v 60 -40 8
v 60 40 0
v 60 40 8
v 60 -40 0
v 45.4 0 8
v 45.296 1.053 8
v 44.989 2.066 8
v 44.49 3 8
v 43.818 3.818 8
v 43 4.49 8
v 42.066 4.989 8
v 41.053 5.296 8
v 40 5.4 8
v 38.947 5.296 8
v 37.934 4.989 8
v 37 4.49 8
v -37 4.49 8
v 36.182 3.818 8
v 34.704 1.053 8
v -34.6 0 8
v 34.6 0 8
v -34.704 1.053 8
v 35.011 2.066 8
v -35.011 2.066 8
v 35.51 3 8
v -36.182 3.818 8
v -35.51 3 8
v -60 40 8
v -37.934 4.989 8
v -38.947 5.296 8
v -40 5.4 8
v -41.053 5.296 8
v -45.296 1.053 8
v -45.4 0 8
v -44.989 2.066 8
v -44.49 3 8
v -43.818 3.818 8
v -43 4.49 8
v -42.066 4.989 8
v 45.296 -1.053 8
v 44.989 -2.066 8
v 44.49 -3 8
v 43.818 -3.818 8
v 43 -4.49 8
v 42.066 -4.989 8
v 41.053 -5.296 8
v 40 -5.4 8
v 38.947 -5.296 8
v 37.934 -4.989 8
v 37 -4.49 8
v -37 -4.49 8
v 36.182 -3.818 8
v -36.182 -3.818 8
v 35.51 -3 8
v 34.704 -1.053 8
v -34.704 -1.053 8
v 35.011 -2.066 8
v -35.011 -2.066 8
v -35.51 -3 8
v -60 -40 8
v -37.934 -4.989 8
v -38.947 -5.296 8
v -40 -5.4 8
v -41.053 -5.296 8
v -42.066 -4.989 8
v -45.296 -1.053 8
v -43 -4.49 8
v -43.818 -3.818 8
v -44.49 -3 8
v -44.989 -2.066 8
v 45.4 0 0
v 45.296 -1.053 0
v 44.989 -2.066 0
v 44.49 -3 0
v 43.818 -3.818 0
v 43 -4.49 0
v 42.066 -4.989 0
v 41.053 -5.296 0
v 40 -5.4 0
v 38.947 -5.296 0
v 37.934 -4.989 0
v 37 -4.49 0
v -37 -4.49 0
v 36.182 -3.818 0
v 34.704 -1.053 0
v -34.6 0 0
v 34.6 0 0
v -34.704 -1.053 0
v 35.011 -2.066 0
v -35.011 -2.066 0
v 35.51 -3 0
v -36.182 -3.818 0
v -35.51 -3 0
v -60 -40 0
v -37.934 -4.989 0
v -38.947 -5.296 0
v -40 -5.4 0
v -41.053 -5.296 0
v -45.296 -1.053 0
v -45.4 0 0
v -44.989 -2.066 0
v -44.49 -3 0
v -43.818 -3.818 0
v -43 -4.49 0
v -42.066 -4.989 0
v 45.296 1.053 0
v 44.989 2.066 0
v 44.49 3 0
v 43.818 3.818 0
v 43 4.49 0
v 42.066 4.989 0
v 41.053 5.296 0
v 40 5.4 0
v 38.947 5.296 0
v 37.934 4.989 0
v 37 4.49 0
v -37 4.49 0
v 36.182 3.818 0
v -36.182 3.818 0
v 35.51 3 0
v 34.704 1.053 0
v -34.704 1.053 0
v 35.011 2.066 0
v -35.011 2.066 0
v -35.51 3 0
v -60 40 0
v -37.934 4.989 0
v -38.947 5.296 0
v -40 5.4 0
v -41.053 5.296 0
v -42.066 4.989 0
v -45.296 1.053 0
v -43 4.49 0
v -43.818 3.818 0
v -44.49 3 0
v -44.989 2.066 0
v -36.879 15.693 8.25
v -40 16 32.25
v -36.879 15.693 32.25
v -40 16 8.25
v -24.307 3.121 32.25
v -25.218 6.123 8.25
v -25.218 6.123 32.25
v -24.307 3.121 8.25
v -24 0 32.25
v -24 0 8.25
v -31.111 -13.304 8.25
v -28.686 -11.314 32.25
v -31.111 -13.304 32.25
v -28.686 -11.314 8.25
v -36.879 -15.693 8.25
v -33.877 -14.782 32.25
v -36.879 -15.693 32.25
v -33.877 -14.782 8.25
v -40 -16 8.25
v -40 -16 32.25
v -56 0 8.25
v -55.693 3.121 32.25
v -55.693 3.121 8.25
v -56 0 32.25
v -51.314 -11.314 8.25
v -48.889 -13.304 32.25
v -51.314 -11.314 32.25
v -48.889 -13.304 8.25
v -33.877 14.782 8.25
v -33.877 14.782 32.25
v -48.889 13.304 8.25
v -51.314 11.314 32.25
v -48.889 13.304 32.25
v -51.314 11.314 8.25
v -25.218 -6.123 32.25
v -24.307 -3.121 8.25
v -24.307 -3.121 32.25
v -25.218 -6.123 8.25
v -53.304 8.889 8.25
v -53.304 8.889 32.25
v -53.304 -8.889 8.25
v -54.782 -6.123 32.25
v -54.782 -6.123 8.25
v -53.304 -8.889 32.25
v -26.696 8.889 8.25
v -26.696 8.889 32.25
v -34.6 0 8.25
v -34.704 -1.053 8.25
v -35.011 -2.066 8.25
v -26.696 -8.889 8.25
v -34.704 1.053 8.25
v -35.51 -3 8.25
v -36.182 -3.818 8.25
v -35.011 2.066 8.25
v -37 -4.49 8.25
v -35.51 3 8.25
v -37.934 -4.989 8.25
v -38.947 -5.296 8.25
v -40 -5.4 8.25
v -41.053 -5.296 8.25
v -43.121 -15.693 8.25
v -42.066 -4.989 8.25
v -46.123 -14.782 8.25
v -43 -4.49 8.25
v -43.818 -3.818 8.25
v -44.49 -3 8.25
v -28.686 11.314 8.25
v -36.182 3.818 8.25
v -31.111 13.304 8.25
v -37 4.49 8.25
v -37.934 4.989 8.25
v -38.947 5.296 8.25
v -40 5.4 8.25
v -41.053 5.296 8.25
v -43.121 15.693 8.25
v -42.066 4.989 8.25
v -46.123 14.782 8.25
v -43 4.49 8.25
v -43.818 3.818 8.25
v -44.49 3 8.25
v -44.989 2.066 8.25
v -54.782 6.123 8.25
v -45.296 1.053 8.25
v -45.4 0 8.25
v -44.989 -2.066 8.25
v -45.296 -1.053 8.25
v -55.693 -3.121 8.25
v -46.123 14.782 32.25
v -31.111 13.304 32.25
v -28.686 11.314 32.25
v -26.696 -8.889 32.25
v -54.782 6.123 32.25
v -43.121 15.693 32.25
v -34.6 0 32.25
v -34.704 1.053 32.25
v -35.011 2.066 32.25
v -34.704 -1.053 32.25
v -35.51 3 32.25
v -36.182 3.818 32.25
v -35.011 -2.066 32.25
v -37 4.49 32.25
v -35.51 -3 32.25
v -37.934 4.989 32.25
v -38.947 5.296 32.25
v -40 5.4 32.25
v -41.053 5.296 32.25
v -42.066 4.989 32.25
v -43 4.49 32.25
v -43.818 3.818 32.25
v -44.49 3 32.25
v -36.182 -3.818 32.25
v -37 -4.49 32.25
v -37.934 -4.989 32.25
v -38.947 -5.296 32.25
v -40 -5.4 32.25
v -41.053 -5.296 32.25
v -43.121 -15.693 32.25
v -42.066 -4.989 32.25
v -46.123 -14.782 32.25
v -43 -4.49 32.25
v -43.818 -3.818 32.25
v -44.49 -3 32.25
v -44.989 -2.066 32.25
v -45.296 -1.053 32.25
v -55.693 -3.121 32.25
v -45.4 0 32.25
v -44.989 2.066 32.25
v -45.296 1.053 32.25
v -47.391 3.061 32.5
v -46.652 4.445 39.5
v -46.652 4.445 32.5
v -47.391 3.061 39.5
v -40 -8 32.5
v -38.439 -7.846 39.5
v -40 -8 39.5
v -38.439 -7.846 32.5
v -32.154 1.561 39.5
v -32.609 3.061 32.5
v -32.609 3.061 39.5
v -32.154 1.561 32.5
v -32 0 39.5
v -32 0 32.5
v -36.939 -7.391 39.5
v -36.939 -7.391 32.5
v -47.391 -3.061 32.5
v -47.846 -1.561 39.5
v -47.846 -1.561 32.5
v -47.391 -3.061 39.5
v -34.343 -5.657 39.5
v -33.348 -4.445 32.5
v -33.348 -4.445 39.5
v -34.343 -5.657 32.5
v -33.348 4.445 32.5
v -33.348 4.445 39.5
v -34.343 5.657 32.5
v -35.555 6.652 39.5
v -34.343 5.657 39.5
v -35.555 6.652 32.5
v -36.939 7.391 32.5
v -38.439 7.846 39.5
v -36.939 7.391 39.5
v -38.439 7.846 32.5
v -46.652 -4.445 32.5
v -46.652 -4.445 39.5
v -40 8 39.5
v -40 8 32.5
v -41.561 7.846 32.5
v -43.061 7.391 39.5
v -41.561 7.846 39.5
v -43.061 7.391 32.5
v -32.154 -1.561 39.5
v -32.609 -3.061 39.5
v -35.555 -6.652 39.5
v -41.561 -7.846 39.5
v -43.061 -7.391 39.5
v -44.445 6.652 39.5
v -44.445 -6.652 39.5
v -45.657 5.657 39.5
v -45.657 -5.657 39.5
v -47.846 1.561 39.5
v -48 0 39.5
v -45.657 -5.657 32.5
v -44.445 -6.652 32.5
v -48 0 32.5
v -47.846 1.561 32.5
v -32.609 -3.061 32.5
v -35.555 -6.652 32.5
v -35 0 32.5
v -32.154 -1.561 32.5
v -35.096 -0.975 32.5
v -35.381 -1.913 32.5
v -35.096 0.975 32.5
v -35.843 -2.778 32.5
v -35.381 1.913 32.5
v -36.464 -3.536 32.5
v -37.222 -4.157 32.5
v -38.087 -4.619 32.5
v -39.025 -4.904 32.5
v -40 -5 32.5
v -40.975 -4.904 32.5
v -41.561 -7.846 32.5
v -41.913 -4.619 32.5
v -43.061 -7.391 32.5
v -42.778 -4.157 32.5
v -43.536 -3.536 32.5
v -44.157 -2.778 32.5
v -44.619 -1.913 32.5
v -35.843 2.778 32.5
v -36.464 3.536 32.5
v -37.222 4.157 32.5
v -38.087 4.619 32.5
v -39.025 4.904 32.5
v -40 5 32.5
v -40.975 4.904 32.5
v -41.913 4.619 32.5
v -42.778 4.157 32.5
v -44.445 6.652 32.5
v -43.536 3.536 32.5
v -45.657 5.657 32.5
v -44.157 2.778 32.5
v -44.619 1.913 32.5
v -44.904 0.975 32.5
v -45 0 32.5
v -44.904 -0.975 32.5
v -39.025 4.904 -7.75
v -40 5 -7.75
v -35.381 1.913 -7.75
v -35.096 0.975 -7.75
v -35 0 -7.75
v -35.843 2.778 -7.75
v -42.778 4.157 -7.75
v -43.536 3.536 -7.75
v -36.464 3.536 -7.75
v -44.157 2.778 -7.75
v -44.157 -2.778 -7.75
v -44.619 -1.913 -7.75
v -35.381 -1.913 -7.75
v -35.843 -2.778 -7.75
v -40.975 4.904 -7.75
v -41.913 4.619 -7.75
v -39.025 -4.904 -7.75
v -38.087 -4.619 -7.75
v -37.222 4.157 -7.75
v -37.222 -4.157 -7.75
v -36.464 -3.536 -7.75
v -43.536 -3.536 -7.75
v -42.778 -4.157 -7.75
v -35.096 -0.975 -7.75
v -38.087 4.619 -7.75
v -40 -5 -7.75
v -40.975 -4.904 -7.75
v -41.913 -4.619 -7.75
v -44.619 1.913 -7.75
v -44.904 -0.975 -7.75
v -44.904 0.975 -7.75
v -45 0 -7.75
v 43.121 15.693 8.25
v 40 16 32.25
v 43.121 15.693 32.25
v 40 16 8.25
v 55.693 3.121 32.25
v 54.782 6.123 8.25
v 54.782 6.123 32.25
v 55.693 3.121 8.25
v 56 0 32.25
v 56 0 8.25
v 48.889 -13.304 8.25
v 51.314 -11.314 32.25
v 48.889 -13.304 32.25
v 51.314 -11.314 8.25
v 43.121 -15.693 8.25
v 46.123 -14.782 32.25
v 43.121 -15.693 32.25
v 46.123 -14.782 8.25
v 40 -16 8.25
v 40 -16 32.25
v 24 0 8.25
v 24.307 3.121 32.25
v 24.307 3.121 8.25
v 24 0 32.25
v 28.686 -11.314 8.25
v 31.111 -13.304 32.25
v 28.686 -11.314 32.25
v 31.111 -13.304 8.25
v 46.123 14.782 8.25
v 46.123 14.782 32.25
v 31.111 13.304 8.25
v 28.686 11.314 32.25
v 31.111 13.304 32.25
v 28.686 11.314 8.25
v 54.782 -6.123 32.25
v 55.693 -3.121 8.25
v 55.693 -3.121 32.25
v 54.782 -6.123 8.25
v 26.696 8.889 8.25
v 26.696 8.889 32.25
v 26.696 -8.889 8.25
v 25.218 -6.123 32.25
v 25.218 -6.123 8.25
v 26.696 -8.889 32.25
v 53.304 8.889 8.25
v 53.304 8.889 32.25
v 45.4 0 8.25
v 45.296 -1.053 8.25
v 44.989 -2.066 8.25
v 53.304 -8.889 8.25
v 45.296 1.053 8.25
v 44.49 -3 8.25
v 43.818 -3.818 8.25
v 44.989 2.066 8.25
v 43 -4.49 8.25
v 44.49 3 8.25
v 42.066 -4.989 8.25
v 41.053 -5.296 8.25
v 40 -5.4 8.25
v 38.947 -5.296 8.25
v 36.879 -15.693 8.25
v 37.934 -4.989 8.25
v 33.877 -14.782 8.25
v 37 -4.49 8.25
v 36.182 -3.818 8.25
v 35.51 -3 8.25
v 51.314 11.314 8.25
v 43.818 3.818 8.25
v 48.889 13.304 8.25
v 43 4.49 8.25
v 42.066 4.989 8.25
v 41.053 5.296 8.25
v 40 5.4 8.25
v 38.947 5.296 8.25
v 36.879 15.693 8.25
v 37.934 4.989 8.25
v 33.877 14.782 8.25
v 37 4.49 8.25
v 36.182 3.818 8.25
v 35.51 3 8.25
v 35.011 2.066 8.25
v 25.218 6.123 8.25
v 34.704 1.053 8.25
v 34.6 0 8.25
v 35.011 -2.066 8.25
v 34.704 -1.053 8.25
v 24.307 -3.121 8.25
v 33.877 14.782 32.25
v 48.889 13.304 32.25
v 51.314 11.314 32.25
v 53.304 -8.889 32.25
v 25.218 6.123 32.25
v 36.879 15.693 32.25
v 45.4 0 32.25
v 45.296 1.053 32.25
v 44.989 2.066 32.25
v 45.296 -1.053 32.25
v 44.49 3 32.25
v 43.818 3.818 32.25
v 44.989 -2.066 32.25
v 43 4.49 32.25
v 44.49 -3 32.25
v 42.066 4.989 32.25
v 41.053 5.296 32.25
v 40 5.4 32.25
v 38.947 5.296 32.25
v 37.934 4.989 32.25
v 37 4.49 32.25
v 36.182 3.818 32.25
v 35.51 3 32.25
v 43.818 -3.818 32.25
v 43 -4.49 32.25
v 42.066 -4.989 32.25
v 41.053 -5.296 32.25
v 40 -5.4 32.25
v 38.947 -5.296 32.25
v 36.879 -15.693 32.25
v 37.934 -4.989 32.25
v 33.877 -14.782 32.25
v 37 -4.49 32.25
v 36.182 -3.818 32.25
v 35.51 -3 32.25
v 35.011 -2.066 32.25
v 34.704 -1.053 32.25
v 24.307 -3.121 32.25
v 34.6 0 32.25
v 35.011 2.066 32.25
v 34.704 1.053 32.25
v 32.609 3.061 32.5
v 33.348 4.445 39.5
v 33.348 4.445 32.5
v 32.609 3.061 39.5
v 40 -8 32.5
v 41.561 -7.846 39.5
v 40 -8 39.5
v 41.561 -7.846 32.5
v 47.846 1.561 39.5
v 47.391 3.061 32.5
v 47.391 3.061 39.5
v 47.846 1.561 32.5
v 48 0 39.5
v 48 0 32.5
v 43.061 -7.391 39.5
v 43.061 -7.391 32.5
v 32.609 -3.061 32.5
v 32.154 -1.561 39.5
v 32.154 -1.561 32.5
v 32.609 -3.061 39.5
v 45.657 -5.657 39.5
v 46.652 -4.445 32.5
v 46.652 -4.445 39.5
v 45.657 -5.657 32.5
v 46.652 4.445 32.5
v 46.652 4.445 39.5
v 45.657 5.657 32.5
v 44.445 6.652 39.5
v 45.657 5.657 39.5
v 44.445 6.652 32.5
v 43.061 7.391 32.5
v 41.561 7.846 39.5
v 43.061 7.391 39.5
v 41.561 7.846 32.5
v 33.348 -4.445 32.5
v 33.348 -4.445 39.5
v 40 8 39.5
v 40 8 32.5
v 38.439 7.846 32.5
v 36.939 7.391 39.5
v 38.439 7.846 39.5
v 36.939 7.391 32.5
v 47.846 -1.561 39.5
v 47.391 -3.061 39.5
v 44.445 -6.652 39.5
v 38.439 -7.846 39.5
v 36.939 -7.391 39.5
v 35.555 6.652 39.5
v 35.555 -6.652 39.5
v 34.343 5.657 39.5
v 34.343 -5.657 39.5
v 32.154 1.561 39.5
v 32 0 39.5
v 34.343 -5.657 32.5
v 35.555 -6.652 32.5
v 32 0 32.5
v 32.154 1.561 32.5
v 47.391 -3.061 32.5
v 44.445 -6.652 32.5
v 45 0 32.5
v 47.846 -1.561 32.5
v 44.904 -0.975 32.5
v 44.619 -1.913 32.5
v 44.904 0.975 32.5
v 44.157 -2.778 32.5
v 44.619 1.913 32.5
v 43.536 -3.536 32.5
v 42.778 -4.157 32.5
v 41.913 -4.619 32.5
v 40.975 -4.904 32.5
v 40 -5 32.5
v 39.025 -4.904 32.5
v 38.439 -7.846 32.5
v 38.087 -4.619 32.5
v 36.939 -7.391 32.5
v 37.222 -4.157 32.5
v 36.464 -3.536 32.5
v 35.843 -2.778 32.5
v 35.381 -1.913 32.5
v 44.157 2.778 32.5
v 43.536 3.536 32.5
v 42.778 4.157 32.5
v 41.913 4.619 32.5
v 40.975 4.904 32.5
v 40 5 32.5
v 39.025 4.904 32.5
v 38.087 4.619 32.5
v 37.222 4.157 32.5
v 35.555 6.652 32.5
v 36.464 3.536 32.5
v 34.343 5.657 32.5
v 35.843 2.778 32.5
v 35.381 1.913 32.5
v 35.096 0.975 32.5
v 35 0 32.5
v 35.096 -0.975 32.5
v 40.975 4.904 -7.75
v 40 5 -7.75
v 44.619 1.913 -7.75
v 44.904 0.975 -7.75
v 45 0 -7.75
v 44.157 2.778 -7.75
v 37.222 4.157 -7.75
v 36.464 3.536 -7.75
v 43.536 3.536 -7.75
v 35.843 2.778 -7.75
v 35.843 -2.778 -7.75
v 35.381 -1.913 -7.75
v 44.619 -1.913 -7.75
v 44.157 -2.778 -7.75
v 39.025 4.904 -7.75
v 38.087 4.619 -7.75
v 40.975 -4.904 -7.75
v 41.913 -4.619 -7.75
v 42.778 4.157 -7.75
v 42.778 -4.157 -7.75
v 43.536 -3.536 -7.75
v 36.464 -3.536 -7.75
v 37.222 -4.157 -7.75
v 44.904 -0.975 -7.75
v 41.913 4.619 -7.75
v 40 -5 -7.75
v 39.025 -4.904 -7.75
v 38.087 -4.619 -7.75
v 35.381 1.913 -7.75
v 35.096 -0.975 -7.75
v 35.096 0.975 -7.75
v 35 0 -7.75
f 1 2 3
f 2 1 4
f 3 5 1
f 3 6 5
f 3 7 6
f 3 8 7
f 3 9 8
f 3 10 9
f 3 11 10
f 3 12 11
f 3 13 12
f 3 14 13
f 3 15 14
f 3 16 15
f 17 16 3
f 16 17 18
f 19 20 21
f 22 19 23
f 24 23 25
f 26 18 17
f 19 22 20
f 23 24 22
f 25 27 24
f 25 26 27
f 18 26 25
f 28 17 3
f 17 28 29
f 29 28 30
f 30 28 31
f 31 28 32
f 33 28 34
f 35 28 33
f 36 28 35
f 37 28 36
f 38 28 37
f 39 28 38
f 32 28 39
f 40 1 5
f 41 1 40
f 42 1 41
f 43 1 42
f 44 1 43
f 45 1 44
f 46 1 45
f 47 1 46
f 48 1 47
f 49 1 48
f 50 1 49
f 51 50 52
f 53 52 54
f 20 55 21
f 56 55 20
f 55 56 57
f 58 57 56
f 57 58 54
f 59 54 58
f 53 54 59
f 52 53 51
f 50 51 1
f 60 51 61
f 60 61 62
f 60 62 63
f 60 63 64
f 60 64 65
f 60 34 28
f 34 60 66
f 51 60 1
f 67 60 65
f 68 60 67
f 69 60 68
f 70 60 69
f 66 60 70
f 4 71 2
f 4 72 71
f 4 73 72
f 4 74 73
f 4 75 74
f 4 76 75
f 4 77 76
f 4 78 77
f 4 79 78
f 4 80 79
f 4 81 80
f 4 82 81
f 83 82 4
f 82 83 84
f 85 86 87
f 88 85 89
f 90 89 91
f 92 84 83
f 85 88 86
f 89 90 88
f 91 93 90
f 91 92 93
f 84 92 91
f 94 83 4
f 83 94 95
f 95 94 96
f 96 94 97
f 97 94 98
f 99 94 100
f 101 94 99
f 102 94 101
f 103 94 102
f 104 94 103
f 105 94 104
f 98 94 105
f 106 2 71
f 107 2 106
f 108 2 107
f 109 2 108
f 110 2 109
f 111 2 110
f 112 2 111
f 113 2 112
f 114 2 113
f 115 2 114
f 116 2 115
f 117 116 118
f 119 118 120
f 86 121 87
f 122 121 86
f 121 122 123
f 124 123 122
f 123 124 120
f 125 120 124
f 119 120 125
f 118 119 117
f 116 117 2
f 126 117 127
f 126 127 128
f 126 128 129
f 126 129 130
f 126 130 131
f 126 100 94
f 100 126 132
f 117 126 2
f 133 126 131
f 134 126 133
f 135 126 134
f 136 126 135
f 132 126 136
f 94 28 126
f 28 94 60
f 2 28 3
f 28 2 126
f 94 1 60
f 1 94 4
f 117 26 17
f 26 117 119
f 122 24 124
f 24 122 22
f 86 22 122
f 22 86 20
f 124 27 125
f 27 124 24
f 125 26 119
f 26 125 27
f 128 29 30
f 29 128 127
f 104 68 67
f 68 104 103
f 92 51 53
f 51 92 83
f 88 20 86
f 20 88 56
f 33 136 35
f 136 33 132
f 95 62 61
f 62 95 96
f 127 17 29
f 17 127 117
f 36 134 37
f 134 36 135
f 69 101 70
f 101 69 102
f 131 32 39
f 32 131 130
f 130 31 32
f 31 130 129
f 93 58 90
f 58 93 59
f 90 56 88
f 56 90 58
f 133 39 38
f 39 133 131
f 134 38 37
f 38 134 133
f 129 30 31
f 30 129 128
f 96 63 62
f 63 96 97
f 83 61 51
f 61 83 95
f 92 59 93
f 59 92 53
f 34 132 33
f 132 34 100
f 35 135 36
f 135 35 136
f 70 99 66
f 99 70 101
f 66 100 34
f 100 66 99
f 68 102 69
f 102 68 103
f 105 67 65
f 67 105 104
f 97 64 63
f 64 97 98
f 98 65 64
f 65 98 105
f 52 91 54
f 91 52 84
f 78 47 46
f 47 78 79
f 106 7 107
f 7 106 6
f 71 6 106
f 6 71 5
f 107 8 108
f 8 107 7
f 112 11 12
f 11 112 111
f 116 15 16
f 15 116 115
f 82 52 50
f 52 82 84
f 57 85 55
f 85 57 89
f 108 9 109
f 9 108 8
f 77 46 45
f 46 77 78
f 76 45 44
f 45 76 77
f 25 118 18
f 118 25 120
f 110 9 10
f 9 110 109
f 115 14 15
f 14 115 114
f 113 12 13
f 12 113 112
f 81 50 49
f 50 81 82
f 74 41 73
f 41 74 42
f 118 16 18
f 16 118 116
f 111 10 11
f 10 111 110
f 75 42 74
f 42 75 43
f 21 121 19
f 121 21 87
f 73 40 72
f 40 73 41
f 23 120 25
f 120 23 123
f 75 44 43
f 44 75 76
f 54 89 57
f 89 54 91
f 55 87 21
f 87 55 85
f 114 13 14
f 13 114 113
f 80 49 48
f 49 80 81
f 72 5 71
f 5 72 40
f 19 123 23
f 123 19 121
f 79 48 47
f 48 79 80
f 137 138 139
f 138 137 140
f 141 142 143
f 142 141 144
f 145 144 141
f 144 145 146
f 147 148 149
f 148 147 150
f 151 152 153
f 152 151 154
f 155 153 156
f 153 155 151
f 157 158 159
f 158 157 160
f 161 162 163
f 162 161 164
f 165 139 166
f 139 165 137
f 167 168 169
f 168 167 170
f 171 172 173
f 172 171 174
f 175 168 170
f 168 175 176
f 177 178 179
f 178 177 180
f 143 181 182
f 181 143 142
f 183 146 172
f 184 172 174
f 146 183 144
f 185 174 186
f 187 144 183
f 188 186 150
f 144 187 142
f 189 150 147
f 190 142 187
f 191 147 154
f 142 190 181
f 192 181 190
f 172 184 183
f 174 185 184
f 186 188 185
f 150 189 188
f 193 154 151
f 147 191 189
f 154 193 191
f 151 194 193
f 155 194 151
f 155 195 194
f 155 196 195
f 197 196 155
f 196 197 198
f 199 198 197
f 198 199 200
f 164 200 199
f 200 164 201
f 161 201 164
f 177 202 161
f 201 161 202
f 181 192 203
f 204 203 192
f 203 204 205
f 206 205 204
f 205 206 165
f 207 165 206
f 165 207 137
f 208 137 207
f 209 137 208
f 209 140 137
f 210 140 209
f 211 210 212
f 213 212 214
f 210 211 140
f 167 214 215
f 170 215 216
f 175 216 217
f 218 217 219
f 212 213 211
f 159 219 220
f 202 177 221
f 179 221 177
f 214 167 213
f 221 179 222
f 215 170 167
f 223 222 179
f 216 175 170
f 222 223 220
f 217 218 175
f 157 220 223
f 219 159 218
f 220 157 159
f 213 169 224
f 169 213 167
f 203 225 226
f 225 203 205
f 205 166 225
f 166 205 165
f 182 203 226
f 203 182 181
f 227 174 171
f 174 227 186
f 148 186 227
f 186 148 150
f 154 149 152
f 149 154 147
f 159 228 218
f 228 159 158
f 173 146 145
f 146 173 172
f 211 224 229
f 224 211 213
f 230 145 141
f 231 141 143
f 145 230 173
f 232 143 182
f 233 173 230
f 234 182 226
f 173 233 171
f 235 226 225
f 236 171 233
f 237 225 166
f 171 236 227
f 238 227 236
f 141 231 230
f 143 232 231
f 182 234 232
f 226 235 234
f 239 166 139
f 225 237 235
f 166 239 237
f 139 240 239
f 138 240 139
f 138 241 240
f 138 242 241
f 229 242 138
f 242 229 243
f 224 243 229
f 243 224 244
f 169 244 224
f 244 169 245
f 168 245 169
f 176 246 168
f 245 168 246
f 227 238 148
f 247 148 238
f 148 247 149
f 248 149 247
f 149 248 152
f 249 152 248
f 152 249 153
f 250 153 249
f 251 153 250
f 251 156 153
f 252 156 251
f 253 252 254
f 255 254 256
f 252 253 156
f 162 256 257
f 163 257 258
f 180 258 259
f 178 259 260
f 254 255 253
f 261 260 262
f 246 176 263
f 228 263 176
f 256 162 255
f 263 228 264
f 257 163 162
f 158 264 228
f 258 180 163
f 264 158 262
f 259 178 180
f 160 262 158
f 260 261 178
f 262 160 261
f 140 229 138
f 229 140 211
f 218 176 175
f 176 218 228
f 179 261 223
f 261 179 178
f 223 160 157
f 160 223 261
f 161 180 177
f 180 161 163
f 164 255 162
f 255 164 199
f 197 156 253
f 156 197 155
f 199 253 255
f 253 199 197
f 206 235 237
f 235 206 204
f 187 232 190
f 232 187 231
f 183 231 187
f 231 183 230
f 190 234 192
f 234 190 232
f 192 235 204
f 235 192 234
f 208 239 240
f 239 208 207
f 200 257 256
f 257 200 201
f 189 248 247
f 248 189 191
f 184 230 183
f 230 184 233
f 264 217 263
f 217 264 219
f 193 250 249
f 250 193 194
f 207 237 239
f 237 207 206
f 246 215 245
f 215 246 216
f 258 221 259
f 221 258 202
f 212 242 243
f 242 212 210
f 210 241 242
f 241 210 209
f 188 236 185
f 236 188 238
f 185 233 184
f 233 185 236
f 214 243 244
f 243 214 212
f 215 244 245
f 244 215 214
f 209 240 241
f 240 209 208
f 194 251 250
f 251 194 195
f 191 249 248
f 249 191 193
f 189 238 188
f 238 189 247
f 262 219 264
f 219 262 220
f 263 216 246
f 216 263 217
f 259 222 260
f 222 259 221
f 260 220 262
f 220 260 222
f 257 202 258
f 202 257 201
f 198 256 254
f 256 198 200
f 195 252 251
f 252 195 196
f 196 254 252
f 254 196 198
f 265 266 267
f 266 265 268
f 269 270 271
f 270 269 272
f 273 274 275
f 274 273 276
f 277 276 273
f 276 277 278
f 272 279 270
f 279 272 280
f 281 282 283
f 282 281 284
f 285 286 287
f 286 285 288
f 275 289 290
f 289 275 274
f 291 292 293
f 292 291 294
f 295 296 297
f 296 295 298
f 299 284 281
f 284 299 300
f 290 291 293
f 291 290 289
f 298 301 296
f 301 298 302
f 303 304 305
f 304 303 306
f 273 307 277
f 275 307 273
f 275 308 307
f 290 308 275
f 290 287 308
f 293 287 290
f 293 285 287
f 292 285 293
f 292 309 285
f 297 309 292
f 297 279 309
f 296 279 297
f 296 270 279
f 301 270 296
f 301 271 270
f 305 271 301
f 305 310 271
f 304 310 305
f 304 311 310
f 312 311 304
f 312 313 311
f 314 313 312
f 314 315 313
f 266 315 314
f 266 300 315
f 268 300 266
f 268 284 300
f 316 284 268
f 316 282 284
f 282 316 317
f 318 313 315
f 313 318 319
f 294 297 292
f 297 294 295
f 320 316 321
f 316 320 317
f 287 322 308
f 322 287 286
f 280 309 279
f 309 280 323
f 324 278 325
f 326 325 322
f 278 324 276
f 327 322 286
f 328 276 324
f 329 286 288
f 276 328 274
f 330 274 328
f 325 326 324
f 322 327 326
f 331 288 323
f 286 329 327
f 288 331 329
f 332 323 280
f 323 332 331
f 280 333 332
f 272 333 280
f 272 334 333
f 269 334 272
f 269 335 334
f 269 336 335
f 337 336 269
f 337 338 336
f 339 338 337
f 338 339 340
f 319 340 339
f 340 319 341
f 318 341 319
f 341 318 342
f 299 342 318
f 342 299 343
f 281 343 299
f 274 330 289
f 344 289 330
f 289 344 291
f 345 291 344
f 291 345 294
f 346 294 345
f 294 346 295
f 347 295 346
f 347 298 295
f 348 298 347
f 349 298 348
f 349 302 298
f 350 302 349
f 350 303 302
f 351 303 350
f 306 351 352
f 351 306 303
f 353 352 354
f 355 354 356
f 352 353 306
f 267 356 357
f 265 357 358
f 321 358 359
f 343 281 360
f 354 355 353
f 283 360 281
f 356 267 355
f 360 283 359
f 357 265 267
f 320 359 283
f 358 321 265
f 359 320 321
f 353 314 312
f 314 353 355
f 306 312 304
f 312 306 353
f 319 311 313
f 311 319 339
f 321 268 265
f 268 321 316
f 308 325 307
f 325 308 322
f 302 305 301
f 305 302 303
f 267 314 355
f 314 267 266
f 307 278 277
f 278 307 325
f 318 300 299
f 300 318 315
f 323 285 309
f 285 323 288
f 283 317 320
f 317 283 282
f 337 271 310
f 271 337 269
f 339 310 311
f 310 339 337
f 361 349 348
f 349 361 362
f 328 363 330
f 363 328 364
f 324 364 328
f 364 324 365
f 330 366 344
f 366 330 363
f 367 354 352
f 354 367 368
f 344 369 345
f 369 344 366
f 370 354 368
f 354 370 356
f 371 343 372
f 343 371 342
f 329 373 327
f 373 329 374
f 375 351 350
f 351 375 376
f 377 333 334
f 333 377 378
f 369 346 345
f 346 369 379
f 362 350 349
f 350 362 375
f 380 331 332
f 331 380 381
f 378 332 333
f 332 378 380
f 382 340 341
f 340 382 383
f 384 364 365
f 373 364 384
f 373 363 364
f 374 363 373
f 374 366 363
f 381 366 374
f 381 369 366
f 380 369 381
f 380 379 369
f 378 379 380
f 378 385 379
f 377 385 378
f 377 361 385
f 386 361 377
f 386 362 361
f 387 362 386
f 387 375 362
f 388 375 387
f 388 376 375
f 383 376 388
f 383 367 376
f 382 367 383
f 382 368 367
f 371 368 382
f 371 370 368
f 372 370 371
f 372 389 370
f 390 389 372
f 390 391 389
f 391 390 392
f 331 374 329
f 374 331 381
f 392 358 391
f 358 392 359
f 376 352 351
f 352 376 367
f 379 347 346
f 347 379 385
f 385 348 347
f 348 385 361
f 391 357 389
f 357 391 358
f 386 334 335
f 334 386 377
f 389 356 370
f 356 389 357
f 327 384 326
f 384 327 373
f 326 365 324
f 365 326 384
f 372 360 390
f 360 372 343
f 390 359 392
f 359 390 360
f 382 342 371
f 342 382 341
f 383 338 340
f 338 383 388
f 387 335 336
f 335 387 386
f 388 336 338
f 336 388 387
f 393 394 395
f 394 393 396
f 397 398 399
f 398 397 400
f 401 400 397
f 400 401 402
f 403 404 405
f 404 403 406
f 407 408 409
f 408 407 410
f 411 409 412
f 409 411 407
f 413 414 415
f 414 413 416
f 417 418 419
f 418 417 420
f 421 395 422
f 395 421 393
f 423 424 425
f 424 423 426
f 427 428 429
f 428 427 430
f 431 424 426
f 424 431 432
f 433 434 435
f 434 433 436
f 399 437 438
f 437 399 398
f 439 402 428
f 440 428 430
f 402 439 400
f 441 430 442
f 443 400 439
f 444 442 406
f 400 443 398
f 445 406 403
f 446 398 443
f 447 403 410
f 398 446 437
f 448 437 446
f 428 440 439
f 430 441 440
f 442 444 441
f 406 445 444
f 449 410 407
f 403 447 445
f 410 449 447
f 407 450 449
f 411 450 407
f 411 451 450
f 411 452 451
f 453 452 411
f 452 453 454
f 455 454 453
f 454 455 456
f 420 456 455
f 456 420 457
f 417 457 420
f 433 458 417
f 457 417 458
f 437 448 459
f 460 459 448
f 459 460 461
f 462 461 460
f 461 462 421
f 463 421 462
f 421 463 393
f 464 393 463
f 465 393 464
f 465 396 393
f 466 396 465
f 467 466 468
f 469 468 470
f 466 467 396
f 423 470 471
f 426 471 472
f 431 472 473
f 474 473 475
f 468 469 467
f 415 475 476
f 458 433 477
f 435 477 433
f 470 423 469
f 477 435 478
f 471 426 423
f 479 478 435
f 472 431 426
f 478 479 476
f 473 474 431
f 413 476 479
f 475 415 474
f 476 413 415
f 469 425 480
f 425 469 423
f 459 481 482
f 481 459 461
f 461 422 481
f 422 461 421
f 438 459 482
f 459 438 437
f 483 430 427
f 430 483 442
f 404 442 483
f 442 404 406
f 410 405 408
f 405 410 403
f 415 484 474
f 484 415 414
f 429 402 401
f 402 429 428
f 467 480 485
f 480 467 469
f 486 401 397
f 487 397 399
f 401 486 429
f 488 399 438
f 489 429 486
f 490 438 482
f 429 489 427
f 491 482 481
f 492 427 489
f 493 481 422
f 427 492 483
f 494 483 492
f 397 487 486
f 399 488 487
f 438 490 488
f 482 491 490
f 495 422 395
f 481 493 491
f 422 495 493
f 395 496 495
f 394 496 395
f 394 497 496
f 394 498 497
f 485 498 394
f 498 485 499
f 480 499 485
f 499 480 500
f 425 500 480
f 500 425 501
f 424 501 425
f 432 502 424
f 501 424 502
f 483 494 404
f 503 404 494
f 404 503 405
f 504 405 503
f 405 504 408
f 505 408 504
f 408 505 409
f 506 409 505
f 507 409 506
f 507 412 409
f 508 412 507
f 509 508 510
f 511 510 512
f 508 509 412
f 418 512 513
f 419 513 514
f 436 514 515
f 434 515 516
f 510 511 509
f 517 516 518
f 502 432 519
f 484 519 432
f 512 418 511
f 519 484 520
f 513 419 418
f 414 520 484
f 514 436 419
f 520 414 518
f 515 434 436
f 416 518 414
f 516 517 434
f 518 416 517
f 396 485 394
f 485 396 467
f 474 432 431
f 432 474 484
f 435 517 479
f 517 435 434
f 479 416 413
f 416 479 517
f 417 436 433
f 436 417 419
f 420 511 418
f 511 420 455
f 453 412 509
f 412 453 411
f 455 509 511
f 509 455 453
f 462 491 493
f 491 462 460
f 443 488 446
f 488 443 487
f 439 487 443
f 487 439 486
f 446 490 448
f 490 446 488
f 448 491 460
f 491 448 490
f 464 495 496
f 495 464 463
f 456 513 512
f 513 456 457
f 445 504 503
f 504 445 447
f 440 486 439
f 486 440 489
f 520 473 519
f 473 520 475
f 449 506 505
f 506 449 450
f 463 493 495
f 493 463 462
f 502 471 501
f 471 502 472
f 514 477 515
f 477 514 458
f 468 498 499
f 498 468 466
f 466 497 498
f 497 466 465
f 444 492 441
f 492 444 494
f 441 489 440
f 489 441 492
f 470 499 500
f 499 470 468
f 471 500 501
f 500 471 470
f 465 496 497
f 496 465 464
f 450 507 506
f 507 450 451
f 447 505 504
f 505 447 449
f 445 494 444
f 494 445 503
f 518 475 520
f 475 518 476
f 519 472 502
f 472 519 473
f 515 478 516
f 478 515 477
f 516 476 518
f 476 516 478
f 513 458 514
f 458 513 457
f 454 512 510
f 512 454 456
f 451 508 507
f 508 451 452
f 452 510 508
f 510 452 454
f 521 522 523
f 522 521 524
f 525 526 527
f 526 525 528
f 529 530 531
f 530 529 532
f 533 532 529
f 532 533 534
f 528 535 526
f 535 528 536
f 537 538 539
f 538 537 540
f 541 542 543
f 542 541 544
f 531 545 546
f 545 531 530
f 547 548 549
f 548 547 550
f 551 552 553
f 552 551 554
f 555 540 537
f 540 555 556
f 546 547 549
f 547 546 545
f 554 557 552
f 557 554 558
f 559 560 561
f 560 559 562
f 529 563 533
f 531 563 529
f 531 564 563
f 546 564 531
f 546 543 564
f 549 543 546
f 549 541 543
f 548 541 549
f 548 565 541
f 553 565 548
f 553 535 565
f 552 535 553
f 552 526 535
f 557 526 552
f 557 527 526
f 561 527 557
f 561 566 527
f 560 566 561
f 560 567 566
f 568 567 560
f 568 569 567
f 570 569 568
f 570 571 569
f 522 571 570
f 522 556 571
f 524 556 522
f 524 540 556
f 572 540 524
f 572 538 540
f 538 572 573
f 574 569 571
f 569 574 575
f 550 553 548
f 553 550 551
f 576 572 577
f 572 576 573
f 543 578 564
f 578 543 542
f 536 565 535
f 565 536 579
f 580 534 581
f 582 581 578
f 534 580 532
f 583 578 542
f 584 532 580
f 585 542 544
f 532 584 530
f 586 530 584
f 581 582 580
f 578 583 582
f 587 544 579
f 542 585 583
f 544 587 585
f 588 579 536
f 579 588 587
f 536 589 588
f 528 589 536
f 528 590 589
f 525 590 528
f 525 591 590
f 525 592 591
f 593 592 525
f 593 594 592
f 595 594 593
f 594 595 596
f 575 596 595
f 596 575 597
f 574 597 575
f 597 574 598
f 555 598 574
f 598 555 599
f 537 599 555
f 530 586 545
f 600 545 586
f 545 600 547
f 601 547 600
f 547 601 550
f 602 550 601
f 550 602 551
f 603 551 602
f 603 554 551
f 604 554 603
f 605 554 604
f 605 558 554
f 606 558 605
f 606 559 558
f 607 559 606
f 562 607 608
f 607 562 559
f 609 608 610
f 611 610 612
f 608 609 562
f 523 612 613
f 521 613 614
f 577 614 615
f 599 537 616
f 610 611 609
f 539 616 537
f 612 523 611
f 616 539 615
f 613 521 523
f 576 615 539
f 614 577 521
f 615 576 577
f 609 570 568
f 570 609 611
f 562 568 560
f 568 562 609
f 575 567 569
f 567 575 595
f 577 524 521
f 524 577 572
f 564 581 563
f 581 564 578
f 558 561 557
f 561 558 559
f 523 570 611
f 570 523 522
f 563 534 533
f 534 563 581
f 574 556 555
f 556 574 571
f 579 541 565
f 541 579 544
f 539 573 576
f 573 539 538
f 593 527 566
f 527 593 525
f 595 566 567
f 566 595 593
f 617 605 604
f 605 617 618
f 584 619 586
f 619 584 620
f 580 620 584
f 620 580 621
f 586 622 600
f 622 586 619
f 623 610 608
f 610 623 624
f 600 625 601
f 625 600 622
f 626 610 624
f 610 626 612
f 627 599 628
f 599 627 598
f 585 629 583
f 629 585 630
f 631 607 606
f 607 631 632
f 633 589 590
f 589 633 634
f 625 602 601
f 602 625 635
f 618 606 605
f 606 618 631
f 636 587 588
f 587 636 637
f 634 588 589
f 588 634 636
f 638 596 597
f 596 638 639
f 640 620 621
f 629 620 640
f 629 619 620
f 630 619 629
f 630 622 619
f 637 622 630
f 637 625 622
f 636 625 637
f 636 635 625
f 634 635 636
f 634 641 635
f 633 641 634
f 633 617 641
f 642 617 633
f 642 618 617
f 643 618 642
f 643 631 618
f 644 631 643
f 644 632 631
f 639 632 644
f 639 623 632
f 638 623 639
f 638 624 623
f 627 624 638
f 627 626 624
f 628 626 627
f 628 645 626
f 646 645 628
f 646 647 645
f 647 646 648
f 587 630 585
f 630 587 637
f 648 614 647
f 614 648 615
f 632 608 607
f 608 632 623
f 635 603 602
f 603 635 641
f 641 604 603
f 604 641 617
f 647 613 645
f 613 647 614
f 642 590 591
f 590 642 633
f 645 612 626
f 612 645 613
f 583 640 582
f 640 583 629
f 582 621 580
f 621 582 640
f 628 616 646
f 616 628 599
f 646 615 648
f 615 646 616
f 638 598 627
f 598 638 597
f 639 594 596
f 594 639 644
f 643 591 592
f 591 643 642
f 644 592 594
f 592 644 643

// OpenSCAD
$fn = 32;

// ------------------------------------------------------------------------
// Standoff columns: 2 d32 standoffs, bolts d10
// Every part is its own module, assembly() places them once.
// ------------------------------------------------------------------------

// --- part 1 ---
module base_plate() {
  difference() {
    translate([-60, -40, 0]) cube([120, 80, 8]);
    translate([-40, 0, -1]) cylinder(h = 10, d = 10.8);
    translate([40, 0, -1]) cylinder(h = 10, d = 10.8);
  }
}

// --- part 2 ---
module spacer1() {
  difference() {
      translate([0, 0, 0]) cylinder(h = 24, d = 32);
      translate([0, 0, -1]) cylinder(h = 26, d = 10.8);
    }
}

// --- part 3 ---
module bolt1() {
  cylinder(h = 7, d = 16);
  translate([0, 0, -40.25]) cylinder(h = 40.25, d = 10);
}

// --- part 4 ---
module spacer2() {
  difference() {
      translate([0, 0, 0]) cylinder(h = 24, d = 32);
      translate([0, 0, -1]) cylinder(h = 26, d = 10.8);
    }
}

// --- part 5 ---
module bolt2() {
  cylinder(h = 7, d = 16);
  translate([0, 0, -40.25]) cylinder(h = 40.25, d = 10);
}

// --- assembly ---
module assembly() {
  translate([0, 0, 0]) rotate([0, 0, 0]) base_plate();
  translate([-40, 0, 8.25]) rotate([0, 0, 0]) spacer1();
  translate([-40, 0, 32.5]) rotate([0, 0, 0]) bolt1();
  translate([40, 0, 8.25]) rotate([0, 0, 0]) spacer2();
  translate([40, 0, 32.5]) rotate([0, 0, 0]) bolt2();
}

assembly();
